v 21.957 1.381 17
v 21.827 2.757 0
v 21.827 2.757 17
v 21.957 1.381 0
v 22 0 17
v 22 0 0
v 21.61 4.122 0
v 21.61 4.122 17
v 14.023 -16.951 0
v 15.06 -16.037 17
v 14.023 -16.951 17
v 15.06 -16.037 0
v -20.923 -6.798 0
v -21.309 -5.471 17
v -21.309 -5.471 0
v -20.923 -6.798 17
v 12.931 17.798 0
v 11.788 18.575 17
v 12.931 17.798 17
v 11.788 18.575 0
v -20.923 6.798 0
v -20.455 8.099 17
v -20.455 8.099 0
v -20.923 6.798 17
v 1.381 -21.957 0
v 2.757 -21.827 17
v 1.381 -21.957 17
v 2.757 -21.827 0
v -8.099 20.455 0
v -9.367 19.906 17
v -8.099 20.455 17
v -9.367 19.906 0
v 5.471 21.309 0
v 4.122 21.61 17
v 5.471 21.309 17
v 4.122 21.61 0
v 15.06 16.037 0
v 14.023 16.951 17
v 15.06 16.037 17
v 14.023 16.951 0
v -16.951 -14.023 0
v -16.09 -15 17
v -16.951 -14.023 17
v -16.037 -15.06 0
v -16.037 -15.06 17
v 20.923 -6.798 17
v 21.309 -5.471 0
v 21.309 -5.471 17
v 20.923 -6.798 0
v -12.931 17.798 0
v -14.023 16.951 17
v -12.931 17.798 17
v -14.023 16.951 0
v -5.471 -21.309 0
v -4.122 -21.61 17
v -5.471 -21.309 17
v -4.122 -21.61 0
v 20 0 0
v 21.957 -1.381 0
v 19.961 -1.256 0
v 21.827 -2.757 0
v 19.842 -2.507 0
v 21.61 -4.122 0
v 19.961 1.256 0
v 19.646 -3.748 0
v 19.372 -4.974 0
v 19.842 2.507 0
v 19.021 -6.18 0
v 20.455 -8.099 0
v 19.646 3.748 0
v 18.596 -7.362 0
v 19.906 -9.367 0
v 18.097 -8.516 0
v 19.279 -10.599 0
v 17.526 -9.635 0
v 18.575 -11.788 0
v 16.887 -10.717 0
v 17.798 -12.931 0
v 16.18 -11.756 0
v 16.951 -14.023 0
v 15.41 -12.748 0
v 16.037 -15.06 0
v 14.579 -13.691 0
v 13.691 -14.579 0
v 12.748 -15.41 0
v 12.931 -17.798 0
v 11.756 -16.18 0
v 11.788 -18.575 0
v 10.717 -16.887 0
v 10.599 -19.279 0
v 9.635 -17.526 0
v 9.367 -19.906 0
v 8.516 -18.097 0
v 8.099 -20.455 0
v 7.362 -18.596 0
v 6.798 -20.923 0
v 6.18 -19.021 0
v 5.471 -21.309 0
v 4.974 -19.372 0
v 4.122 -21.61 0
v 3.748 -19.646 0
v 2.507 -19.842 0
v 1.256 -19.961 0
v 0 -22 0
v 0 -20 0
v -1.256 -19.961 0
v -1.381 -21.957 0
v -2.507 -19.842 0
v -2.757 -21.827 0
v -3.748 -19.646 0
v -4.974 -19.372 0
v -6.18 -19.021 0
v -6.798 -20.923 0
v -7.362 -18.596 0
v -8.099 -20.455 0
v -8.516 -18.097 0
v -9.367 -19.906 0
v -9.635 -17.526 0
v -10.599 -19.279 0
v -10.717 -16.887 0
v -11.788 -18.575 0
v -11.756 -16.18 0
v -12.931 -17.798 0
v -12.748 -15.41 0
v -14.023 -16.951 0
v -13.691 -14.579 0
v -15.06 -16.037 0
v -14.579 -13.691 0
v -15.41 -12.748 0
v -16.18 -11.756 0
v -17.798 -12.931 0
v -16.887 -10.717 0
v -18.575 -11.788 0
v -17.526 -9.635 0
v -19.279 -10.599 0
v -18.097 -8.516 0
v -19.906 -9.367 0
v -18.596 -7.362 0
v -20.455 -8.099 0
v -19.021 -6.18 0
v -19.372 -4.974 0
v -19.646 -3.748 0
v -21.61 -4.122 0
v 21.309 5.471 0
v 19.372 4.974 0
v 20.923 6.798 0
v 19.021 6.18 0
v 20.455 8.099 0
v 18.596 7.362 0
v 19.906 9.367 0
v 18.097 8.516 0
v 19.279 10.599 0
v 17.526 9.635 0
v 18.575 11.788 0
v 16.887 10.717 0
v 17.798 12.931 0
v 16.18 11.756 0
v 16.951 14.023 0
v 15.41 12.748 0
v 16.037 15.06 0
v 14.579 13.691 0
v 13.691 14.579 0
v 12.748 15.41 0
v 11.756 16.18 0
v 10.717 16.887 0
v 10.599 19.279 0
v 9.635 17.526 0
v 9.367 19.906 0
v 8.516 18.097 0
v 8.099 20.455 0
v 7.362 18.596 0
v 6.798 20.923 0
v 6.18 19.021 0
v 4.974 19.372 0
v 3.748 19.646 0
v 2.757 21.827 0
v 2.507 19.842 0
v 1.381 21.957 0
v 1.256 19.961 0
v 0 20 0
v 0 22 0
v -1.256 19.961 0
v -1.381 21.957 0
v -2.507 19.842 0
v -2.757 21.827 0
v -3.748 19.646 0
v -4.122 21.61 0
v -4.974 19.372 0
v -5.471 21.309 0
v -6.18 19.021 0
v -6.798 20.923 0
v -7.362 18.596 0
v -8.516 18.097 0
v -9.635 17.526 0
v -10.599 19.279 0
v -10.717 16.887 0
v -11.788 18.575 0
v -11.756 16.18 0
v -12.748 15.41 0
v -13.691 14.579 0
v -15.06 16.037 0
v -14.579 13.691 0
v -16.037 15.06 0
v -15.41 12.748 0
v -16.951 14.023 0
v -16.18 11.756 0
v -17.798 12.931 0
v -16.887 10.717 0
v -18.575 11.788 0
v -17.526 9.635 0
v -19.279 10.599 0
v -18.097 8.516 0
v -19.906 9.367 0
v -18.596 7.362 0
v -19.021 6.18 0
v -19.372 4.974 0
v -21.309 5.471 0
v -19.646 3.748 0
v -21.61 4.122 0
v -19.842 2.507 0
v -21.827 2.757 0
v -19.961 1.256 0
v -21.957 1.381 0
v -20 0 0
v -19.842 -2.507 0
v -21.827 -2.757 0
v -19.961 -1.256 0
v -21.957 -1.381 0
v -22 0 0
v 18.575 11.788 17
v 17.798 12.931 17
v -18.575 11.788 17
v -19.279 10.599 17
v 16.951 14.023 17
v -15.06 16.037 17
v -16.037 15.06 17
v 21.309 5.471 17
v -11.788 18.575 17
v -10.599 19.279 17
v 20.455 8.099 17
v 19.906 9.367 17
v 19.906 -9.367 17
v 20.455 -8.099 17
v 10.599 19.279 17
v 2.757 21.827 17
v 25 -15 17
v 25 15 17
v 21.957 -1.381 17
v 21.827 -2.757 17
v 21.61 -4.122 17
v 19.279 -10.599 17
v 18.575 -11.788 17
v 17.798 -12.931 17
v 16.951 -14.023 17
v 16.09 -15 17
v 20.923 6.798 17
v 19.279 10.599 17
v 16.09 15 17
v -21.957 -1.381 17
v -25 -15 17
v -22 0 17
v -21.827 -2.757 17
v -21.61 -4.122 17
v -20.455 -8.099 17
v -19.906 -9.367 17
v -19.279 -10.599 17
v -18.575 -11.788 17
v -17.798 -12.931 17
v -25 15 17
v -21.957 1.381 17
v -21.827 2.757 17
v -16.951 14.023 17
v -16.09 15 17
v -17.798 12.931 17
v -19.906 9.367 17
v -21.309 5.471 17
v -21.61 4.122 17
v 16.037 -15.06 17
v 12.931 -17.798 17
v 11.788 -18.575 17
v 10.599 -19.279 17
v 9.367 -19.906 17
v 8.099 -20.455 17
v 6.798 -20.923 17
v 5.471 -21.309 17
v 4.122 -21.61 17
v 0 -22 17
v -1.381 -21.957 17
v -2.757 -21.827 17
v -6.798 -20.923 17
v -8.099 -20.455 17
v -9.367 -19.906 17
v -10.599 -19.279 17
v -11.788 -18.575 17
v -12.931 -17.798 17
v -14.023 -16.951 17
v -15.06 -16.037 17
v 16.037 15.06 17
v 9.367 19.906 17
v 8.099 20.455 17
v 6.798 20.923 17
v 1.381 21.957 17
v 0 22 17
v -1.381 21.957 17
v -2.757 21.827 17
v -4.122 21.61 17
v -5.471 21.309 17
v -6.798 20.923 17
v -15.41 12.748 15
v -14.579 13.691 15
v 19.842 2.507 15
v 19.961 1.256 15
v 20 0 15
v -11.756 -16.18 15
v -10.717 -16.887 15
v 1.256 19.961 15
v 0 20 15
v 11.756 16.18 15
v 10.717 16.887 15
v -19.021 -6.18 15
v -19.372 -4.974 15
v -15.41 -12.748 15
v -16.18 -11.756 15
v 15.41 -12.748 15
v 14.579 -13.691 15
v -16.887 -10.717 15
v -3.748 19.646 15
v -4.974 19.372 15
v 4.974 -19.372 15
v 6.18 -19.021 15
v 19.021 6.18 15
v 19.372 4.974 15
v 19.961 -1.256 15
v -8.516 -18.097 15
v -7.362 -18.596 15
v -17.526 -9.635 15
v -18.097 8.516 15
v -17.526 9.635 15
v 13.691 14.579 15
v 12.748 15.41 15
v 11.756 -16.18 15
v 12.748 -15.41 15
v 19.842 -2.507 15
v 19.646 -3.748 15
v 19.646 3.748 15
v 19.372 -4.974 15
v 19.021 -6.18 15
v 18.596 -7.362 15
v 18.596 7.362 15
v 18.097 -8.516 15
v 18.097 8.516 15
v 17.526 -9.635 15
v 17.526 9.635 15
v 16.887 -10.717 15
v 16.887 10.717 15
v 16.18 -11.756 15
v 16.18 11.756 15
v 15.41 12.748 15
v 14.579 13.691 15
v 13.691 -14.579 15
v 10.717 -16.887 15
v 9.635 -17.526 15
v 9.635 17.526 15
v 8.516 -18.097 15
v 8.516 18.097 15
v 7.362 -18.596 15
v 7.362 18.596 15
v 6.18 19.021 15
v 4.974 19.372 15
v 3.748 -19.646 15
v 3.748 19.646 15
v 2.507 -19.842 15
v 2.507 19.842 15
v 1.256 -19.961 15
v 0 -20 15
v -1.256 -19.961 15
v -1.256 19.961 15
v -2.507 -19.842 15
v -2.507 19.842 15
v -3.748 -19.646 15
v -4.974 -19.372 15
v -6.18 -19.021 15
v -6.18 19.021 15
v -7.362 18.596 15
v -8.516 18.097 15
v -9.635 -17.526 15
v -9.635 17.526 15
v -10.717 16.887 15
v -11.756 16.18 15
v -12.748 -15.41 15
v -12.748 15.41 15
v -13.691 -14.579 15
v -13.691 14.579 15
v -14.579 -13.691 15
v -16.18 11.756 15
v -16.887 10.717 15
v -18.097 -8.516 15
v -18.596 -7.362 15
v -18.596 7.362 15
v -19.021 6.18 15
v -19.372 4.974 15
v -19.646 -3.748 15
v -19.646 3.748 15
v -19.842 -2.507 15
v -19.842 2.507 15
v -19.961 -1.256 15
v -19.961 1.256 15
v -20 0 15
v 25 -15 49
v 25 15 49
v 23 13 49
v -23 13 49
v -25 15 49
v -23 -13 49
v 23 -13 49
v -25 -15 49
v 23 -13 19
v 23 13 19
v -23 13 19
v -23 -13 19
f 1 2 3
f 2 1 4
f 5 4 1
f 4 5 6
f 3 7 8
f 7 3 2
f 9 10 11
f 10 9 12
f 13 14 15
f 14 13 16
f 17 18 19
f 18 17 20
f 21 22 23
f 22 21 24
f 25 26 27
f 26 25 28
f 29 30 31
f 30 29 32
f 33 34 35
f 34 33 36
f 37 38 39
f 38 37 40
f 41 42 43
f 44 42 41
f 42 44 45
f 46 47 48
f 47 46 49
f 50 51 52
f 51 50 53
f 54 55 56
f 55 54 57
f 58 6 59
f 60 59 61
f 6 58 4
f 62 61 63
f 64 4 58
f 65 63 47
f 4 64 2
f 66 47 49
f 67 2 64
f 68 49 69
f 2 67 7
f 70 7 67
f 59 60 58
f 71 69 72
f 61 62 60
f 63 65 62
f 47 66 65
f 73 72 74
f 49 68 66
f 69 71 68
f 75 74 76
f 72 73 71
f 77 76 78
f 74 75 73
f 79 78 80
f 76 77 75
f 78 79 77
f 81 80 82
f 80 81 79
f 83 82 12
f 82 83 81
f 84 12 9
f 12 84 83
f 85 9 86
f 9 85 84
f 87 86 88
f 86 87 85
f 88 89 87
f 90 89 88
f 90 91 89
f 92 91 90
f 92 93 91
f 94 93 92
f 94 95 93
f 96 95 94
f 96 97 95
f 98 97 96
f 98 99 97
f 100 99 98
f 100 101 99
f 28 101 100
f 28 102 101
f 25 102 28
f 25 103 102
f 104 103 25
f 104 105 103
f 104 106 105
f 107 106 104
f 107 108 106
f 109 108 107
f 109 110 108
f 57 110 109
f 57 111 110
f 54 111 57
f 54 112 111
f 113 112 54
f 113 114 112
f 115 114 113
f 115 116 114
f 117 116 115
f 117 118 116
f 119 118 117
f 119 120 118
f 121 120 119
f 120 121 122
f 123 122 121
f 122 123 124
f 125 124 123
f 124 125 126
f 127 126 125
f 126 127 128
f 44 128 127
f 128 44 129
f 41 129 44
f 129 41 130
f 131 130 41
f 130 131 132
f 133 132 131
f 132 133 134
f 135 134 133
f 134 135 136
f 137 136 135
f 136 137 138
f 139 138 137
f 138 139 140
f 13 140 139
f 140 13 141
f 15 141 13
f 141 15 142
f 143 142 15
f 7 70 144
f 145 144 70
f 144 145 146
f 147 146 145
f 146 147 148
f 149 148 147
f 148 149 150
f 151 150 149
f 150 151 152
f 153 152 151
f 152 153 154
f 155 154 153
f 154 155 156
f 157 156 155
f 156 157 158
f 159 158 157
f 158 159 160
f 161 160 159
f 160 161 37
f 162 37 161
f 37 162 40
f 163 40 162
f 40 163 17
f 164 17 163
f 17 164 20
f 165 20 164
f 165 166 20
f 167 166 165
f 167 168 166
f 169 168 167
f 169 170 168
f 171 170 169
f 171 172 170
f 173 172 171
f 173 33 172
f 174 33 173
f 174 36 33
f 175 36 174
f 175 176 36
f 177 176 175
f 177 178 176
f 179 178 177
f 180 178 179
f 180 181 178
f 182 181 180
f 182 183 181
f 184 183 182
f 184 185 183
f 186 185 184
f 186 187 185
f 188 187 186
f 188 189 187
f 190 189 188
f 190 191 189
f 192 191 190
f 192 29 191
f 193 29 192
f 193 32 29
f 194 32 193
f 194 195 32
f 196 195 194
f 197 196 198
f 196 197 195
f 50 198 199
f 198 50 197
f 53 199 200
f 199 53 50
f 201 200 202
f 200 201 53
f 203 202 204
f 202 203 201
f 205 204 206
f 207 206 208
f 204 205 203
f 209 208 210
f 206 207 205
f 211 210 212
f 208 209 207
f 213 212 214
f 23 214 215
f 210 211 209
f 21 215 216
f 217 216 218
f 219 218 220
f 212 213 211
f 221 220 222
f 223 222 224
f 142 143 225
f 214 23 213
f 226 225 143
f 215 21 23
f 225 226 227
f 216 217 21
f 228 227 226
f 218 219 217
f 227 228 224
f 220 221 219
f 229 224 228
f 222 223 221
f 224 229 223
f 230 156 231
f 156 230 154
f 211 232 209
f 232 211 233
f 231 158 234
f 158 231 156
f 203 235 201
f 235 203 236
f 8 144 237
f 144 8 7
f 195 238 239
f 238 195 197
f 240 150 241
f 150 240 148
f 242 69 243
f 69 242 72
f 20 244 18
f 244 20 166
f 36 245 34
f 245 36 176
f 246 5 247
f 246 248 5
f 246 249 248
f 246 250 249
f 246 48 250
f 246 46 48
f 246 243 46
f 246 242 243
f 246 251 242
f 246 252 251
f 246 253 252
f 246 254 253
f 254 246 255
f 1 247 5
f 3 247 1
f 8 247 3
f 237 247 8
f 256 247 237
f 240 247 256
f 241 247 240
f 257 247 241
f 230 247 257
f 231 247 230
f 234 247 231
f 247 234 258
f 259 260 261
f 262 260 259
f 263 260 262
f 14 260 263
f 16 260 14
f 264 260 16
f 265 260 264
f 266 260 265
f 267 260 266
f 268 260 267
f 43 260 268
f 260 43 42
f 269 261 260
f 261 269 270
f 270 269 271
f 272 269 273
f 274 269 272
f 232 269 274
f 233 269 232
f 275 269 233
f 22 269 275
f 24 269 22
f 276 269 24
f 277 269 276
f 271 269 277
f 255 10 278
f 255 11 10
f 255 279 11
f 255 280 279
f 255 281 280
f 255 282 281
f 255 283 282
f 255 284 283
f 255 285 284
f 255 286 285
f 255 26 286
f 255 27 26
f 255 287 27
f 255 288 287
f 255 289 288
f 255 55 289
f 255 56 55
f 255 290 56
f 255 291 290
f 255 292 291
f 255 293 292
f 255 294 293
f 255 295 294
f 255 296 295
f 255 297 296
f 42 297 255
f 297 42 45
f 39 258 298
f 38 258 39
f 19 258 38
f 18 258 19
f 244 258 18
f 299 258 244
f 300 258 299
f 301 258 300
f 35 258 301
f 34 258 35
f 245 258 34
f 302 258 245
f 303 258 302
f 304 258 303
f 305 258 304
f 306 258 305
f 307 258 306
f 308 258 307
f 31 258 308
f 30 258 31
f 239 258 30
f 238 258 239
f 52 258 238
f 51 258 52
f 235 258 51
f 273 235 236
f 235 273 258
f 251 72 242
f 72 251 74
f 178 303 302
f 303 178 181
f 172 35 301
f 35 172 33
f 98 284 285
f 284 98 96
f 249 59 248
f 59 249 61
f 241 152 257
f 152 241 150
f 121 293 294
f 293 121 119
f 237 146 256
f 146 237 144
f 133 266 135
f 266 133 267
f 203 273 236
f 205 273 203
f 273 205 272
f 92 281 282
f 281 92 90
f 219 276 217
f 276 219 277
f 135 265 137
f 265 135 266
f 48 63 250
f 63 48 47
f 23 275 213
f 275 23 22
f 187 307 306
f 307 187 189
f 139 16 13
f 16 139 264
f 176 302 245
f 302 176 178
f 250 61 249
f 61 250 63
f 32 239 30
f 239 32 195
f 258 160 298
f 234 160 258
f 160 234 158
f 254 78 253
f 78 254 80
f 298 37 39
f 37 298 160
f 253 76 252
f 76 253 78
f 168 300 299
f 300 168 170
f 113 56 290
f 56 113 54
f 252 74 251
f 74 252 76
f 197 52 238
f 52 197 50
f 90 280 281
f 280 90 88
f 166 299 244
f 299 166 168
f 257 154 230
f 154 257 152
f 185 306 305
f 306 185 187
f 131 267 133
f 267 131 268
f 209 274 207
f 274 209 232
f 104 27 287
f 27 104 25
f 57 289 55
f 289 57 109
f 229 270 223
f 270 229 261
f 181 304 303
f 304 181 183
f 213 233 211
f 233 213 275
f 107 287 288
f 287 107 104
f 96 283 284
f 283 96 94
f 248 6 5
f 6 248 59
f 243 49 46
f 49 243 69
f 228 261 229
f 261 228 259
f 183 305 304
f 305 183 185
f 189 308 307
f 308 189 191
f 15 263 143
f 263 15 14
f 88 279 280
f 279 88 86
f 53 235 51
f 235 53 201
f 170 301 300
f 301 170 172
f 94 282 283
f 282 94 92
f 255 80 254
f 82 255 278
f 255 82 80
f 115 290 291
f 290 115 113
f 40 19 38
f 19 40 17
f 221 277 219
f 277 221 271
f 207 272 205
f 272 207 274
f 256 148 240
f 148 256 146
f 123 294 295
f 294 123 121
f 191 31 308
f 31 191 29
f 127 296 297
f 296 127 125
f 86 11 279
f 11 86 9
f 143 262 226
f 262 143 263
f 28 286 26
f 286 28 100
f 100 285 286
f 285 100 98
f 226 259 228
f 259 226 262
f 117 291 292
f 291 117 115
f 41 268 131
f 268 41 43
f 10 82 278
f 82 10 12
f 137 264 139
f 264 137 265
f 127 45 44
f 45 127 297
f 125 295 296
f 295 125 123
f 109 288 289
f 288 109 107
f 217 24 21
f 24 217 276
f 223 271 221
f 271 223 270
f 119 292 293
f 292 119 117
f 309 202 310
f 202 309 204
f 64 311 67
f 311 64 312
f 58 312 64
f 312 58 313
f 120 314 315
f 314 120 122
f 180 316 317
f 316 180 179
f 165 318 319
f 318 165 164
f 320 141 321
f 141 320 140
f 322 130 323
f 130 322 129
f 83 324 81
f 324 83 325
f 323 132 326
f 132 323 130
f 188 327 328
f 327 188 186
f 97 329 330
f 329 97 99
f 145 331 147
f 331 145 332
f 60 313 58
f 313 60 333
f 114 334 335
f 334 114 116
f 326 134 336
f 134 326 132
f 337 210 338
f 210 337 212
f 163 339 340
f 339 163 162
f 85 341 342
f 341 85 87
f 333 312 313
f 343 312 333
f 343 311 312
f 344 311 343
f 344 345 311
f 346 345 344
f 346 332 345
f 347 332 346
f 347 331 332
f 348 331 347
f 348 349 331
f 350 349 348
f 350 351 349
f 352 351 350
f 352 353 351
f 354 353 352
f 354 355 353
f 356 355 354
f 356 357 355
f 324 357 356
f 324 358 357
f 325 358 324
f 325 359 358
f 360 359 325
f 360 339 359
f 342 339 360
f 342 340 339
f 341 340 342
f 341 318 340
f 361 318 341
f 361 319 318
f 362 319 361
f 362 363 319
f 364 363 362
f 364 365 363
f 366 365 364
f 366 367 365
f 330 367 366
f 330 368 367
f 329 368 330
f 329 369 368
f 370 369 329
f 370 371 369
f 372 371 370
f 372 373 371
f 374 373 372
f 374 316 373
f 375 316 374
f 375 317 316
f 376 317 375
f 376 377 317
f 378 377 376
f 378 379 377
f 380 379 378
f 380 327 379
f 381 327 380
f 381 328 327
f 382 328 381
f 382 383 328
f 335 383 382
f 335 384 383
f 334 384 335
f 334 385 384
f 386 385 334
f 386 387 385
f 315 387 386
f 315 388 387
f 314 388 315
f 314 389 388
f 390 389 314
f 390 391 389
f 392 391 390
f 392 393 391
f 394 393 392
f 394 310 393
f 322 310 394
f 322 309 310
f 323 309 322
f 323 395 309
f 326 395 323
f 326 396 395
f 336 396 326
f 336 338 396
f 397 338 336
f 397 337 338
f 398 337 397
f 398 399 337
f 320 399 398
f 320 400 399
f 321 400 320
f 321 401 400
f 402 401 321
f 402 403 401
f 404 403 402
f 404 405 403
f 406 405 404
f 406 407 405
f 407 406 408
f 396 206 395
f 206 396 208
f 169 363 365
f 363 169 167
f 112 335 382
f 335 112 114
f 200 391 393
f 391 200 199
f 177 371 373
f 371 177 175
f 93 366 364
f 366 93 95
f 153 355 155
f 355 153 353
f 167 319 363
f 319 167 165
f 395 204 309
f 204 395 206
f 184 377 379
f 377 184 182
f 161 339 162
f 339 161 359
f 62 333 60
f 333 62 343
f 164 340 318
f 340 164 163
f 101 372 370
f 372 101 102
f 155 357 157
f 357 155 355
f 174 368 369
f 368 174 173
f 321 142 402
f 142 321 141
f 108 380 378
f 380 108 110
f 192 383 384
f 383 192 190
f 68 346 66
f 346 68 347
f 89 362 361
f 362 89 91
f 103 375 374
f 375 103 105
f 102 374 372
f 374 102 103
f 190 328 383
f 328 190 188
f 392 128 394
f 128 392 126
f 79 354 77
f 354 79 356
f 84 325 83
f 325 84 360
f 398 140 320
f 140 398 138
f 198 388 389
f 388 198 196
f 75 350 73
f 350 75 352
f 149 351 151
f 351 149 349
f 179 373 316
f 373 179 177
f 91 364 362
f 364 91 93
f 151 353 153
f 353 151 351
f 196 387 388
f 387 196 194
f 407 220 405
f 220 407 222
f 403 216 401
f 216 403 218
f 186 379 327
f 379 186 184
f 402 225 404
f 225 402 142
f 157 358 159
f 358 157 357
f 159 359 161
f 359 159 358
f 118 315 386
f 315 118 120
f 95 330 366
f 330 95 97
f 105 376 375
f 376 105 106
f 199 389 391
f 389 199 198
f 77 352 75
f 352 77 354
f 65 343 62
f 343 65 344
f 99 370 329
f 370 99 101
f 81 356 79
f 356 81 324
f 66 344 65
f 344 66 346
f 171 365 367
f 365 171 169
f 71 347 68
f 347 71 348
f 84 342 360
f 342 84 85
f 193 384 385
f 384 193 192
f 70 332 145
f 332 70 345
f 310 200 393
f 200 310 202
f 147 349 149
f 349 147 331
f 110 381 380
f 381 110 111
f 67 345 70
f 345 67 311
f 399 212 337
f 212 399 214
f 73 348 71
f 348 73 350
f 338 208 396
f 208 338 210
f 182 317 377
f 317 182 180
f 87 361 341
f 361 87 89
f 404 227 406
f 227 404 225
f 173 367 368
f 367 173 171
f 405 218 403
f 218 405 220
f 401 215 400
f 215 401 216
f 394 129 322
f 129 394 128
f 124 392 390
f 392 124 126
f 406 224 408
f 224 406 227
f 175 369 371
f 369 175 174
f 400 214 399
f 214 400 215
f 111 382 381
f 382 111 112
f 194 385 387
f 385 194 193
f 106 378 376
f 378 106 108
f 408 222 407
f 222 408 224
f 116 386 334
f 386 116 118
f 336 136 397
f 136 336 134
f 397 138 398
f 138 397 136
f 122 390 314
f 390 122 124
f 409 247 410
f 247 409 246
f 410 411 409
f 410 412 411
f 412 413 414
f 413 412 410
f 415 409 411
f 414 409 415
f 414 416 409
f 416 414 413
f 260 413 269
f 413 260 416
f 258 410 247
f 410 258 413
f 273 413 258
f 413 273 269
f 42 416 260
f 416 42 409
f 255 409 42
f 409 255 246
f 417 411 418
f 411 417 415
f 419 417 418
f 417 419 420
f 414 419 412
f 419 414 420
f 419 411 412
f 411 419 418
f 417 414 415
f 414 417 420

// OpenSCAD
$fn = 100;
r = 20;
t = 2;
l = 15;
b = 46;
w = 26;

difference(){
cylinder(r=r+t,h=l+t);
cylinder(r=r,h=l);
}

translate([-(b+2*t)/2,-(w+2*t)/2,l+t])
difference(){
cube([b+2*t,w+2*t,2*l+t]);
translate([t,t,t])
cube([b,w,2*l]);
}
